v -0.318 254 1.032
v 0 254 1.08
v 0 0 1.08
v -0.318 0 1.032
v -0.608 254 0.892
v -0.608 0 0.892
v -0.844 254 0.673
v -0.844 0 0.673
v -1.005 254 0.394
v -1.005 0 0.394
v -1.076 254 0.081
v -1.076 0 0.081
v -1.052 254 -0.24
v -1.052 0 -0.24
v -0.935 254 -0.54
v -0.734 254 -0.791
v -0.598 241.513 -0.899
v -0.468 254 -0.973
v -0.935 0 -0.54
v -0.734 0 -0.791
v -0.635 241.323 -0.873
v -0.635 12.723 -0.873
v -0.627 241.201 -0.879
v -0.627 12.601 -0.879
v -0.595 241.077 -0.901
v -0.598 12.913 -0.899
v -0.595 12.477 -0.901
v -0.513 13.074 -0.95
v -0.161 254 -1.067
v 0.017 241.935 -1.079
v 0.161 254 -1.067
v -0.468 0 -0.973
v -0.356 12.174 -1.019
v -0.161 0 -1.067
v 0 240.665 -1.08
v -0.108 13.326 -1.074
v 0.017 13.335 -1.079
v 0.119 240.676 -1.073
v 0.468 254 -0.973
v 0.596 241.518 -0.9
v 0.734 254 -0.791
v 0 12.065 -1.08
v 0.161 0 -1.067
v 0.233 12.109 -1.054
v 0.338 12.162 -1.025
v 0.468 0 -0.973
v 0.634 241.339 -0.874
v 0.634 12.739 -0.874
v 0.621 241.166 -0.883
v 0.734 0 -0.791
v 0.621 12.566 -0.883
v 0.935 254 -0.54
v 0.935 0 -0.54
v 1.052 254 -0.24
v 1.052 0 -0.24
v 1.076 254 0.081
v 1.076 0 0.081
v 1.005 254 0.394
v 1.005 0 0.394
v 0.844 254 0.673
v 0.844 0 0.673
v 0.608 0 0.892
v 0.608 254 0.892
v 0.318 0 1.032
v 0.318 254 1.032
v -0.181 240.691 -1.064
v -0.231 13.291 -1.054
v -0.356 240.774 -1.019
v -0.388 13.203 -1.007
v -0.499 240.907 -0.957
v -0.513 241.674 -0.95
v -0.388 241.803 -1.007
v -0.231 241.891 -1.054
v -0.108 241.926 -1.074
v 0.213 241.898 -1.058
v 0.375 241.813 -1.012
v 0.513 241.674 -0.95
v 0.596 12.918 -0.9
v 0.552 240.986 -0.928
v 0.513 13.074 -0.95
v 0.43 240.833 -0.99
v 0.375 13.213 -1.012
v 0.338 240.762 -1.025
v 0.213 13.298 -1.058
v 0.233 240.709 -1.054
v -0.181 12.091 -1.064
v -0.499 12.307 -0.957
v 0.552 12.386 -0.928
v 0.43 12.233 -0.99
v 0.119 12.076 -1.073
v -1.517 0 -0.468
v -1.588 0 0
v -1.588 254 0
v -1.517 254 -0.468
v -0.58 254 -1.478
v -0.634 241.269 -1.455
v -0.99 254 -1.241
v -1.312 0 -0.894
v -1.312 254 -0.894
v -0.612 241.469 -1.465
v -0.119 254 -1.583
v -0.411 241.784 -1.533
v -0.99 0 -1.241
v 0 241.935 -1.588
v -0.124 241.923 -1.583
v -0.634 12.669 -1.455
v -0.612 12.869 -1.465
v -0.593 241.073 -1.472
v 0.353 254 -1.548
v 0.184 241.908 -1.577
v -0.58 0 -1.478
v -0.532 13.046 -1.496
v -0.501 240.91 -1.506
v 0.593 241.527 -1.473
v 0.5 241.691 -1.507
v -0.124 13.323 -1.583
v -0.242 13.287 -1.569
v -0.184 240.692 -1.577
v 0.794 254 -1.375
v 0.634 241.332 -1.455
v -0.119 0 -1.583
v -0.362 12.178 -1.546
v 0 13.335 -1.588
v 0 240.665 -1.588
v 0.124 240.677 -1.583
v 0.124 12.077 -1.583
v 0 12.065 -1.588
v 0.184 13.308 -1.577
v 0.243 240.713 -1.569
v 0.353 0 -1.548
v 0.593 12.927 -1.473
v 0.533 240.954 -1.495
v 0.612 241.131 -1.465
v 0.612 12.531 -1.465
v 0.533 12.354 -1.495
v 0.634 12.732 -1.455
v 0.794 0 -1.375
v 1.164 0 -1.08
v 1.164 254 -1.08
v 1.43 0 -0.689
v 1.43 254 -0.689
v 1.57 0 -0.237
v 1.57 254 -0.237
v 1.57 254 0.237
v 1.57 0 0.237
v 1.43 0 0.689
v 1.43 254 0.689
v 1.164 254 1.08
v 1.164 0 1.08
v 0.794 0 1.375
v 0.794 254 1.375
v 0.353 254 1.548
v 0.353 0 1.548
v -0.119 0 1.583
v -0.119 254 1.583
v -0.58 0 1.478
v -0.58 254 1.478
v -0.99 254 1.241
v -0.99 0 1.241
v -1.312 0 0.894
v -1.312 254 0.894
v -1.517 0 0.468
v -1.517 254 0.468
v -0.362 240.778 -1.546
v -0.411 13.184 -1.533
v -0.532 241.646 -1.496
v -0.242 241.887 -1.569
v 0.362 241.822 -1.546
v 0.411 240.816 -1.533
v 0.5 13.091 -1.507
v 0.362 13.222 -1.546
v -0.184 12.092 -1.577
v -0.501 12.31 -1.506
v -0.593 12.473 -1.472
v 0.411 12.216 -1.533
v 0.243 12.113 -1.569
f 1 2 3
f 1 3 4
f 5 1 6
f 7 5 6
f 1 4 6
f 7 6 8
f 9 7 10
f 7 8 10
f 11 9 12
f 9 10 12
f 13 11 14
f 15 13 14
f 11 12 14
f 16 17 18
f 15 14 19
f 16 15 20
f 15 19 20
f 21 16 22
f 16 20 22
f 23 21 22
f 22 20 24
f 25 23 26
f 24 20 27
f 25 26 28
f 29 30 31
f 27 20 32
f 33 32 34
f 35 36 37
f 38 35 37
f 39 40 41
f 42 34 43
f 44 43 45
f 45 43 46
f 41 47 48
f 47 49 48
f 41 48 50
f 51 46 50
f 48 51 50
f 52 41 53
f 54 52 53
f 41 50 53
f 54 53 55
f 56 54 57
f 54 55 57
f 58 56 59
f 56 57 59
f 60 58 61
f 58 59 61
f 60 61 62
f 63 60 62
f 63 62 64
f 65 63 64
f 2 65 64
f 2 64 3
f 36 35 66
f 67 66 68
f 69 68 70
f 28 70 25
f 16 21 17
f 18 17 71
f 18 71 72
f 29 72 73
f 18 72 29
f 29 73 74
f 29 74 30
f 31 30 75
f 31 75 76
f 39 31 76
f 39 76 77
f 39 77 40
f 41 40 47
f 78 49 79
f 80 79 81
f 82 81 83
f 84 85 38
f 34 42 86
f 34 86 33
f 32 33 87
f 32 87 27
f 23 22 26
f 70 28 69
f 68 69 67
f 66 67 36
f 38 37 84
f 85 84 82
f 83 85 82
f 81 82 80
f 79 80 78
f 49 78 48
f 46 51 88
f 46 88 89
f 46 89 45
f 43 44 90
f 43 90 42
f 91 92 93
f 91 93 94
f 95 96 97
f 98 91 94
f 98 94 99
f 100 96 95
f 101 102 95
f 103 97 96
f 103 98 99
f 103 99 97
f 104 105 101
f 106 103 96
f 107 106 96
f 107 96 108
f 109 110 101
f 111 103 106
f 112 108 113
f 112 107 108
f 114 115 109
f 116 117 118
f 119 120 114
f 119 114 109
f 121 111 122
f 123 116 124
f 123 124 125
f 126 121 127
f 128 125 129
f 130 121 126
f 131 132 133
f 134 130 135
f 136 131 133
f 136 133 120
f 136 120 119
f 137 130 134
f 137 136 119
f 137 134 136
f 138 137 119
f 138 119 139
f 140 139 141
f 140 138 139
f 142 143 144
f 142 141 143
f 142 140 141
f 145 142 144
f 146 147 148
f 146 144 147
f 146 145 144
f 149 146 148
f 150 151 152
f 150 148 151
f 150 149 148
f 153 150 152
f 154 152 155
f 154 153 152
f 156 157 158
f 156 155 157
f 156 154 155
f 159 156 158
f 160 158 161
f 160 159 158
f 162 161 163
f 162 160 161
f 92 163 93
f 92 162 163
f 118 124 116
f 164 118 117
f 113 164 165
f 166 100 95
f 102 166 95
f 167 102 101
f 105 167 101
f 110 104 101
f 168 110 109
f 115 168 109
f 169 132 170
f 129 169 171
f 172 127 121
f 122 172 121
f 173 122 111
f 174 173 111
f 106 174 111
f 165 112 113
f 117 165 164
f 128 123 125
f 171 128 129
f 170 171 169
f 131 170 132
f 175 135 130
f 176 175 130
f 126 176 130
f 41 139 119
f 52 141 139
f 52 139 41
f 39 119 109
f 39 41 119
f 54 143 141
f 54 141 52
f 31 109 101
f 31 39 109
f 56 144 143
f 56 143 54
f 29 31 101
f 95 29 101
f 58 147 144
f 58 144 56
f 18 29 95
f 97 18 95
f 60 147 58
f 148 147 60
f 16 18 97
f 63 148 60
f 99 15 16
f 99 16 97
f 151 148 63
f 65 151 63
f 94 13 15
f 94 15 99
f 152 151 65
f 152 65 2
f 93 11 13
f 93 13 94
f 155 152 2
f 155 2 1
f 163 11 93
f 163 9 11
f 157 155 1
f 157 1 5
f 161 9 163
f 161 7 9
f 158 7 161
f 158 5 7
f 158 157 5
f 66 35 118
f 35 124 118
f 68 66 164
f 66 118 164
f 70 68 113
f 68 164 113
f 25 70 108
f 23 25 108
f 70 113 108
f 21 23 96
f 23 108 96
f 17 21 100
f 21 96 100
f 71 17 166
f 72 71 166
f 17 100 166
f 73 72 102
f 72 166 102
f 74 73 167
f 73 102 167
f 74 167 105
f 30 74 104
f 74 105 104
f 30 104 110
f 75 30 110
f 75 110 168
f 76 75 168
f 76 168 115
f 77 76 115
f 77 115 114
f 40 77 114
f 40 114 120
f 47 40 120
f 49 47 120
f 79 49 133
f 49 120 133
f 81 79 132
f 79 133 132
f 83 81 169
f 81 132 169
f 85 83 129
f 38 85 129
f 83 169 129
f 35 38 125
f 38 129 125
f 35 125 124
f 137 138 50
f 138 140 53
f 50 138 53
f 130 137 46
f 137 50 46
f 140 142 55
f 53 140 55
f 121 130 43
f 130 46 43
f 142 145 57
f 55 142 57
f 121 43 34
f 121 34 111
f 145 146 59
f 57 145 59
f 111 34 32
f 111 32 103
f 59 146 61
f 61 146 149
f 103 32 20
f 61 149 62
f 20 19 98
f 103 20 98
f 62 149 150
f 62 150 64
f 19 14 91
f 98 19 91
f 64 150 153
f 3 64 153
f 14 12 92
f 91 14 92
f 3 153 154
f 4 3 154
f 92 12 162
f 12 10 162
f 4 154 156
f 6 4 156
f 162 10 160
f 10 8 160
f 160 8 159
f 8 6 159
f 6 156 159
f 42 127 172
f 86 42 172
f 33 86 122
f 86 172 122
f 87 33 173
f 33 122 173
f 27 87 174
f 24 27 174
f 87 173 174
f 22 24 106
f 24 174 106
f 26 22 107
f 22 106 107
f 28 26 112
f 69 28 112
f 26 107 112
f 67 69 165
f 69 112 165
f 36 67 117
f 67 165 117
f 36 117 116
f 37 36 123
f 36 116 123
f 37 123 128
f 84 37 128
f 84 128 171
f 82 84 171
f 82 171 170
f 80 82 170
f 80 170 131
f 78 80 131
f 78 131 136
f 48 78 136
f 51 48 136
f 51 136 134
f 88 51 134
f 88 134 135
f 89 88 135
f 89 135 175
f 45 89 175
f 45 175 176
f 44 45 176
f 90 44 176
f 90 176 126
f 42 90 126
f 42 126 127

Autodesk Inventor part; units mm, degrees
ref_plane "YZ Plane" through (0, 0, 0) normal (1, 0, 0) x (0, 1, 0)
ref_plane "XZ Plane" through (0, 0, 0) normal (0, 1, 0) x (-1, 0, 0)
ref_plane "XY Plane" through (0, 0, 0) normal (0, 0, 1) x (1, 0, 0)
sketch "Sketch1" plane through (0, 0, 0) normal (0, 1, 0) x (-1, 0, 0)
  circle A0 centre (0, 0) radius 1.5875
  dimension "d0" = 3.175
extrude "Extrusion1" add sketch "Sketch1" along normal blind 254
sketch "Sketch2" plane through (0, 254, 0) normal (0, 1, 0) x (1, 0, 0)
  circle A0 centre (0, 0) radius 1.5875 projected
hole "Hole1" at (0, 254, 0) direction (0, -1, 0) diameter 2.159 end through all
sketch "Sketch3" plane through (0, 0, 0) normal (0, 0, 1) x (1, 0, 0)
  line L0 (1.5875, 0) -> (-1.5875, 0) projected
  line L1 (0, 0) -> (0, 6.35)
  line L2 (0, 0) -> (6.35, 0) construction
  line L3 (0, 6.35) -> (0, 8.89)
  line L4 (0, 8.89) -> (0, 12.7)
  line L5 (0, 8.89) -> (3.81, 8.89) construction
  circle A0 centre (0, 12.7) radius 0.635
  dimension "d10" = 6.35
  dimension "d11" = 270
  dimension "d12" = 2.54
  dimension "d13" = 3.81
  dimension "d14" = 90
  dimension "d15" = 1.27
sketch "Sketch4" plane through (0, 0, 0) normal (0, 1, 0) x (-1, 0, 0)
  point P0 (0, 0)
sketch "Sketch5" plane through (0, 0, 0) normal (0, 0, 1) x (1, 0, 0)
  line L0 (-1.0795, 254) -> (1.0795, 254) projected
  line L1 (0, 254) -> (0, 241.3)
  circle A0 centre (0, 241.3) radius 0.635
  point P0 (0, 0)
  dimension "d16" = 12.7
  dimension "d17" = 1.27
hole "Hole2" at (0, 241.3, 0) direction (0, 0, -1) diameter 1.27 depth 1.5875 tip angle 118
hole "Hole3" at (0, 12.7, 0) direction (0, 0, -1) diameter 1.27 depth 1.5875 tip angle 118
sketch "Sketch6" plane through (0, 0, 0) normal (1, 0, 0) x (0, 1, 0)
  point P0 (0, 0)
properties part number "burder_rod_2"
